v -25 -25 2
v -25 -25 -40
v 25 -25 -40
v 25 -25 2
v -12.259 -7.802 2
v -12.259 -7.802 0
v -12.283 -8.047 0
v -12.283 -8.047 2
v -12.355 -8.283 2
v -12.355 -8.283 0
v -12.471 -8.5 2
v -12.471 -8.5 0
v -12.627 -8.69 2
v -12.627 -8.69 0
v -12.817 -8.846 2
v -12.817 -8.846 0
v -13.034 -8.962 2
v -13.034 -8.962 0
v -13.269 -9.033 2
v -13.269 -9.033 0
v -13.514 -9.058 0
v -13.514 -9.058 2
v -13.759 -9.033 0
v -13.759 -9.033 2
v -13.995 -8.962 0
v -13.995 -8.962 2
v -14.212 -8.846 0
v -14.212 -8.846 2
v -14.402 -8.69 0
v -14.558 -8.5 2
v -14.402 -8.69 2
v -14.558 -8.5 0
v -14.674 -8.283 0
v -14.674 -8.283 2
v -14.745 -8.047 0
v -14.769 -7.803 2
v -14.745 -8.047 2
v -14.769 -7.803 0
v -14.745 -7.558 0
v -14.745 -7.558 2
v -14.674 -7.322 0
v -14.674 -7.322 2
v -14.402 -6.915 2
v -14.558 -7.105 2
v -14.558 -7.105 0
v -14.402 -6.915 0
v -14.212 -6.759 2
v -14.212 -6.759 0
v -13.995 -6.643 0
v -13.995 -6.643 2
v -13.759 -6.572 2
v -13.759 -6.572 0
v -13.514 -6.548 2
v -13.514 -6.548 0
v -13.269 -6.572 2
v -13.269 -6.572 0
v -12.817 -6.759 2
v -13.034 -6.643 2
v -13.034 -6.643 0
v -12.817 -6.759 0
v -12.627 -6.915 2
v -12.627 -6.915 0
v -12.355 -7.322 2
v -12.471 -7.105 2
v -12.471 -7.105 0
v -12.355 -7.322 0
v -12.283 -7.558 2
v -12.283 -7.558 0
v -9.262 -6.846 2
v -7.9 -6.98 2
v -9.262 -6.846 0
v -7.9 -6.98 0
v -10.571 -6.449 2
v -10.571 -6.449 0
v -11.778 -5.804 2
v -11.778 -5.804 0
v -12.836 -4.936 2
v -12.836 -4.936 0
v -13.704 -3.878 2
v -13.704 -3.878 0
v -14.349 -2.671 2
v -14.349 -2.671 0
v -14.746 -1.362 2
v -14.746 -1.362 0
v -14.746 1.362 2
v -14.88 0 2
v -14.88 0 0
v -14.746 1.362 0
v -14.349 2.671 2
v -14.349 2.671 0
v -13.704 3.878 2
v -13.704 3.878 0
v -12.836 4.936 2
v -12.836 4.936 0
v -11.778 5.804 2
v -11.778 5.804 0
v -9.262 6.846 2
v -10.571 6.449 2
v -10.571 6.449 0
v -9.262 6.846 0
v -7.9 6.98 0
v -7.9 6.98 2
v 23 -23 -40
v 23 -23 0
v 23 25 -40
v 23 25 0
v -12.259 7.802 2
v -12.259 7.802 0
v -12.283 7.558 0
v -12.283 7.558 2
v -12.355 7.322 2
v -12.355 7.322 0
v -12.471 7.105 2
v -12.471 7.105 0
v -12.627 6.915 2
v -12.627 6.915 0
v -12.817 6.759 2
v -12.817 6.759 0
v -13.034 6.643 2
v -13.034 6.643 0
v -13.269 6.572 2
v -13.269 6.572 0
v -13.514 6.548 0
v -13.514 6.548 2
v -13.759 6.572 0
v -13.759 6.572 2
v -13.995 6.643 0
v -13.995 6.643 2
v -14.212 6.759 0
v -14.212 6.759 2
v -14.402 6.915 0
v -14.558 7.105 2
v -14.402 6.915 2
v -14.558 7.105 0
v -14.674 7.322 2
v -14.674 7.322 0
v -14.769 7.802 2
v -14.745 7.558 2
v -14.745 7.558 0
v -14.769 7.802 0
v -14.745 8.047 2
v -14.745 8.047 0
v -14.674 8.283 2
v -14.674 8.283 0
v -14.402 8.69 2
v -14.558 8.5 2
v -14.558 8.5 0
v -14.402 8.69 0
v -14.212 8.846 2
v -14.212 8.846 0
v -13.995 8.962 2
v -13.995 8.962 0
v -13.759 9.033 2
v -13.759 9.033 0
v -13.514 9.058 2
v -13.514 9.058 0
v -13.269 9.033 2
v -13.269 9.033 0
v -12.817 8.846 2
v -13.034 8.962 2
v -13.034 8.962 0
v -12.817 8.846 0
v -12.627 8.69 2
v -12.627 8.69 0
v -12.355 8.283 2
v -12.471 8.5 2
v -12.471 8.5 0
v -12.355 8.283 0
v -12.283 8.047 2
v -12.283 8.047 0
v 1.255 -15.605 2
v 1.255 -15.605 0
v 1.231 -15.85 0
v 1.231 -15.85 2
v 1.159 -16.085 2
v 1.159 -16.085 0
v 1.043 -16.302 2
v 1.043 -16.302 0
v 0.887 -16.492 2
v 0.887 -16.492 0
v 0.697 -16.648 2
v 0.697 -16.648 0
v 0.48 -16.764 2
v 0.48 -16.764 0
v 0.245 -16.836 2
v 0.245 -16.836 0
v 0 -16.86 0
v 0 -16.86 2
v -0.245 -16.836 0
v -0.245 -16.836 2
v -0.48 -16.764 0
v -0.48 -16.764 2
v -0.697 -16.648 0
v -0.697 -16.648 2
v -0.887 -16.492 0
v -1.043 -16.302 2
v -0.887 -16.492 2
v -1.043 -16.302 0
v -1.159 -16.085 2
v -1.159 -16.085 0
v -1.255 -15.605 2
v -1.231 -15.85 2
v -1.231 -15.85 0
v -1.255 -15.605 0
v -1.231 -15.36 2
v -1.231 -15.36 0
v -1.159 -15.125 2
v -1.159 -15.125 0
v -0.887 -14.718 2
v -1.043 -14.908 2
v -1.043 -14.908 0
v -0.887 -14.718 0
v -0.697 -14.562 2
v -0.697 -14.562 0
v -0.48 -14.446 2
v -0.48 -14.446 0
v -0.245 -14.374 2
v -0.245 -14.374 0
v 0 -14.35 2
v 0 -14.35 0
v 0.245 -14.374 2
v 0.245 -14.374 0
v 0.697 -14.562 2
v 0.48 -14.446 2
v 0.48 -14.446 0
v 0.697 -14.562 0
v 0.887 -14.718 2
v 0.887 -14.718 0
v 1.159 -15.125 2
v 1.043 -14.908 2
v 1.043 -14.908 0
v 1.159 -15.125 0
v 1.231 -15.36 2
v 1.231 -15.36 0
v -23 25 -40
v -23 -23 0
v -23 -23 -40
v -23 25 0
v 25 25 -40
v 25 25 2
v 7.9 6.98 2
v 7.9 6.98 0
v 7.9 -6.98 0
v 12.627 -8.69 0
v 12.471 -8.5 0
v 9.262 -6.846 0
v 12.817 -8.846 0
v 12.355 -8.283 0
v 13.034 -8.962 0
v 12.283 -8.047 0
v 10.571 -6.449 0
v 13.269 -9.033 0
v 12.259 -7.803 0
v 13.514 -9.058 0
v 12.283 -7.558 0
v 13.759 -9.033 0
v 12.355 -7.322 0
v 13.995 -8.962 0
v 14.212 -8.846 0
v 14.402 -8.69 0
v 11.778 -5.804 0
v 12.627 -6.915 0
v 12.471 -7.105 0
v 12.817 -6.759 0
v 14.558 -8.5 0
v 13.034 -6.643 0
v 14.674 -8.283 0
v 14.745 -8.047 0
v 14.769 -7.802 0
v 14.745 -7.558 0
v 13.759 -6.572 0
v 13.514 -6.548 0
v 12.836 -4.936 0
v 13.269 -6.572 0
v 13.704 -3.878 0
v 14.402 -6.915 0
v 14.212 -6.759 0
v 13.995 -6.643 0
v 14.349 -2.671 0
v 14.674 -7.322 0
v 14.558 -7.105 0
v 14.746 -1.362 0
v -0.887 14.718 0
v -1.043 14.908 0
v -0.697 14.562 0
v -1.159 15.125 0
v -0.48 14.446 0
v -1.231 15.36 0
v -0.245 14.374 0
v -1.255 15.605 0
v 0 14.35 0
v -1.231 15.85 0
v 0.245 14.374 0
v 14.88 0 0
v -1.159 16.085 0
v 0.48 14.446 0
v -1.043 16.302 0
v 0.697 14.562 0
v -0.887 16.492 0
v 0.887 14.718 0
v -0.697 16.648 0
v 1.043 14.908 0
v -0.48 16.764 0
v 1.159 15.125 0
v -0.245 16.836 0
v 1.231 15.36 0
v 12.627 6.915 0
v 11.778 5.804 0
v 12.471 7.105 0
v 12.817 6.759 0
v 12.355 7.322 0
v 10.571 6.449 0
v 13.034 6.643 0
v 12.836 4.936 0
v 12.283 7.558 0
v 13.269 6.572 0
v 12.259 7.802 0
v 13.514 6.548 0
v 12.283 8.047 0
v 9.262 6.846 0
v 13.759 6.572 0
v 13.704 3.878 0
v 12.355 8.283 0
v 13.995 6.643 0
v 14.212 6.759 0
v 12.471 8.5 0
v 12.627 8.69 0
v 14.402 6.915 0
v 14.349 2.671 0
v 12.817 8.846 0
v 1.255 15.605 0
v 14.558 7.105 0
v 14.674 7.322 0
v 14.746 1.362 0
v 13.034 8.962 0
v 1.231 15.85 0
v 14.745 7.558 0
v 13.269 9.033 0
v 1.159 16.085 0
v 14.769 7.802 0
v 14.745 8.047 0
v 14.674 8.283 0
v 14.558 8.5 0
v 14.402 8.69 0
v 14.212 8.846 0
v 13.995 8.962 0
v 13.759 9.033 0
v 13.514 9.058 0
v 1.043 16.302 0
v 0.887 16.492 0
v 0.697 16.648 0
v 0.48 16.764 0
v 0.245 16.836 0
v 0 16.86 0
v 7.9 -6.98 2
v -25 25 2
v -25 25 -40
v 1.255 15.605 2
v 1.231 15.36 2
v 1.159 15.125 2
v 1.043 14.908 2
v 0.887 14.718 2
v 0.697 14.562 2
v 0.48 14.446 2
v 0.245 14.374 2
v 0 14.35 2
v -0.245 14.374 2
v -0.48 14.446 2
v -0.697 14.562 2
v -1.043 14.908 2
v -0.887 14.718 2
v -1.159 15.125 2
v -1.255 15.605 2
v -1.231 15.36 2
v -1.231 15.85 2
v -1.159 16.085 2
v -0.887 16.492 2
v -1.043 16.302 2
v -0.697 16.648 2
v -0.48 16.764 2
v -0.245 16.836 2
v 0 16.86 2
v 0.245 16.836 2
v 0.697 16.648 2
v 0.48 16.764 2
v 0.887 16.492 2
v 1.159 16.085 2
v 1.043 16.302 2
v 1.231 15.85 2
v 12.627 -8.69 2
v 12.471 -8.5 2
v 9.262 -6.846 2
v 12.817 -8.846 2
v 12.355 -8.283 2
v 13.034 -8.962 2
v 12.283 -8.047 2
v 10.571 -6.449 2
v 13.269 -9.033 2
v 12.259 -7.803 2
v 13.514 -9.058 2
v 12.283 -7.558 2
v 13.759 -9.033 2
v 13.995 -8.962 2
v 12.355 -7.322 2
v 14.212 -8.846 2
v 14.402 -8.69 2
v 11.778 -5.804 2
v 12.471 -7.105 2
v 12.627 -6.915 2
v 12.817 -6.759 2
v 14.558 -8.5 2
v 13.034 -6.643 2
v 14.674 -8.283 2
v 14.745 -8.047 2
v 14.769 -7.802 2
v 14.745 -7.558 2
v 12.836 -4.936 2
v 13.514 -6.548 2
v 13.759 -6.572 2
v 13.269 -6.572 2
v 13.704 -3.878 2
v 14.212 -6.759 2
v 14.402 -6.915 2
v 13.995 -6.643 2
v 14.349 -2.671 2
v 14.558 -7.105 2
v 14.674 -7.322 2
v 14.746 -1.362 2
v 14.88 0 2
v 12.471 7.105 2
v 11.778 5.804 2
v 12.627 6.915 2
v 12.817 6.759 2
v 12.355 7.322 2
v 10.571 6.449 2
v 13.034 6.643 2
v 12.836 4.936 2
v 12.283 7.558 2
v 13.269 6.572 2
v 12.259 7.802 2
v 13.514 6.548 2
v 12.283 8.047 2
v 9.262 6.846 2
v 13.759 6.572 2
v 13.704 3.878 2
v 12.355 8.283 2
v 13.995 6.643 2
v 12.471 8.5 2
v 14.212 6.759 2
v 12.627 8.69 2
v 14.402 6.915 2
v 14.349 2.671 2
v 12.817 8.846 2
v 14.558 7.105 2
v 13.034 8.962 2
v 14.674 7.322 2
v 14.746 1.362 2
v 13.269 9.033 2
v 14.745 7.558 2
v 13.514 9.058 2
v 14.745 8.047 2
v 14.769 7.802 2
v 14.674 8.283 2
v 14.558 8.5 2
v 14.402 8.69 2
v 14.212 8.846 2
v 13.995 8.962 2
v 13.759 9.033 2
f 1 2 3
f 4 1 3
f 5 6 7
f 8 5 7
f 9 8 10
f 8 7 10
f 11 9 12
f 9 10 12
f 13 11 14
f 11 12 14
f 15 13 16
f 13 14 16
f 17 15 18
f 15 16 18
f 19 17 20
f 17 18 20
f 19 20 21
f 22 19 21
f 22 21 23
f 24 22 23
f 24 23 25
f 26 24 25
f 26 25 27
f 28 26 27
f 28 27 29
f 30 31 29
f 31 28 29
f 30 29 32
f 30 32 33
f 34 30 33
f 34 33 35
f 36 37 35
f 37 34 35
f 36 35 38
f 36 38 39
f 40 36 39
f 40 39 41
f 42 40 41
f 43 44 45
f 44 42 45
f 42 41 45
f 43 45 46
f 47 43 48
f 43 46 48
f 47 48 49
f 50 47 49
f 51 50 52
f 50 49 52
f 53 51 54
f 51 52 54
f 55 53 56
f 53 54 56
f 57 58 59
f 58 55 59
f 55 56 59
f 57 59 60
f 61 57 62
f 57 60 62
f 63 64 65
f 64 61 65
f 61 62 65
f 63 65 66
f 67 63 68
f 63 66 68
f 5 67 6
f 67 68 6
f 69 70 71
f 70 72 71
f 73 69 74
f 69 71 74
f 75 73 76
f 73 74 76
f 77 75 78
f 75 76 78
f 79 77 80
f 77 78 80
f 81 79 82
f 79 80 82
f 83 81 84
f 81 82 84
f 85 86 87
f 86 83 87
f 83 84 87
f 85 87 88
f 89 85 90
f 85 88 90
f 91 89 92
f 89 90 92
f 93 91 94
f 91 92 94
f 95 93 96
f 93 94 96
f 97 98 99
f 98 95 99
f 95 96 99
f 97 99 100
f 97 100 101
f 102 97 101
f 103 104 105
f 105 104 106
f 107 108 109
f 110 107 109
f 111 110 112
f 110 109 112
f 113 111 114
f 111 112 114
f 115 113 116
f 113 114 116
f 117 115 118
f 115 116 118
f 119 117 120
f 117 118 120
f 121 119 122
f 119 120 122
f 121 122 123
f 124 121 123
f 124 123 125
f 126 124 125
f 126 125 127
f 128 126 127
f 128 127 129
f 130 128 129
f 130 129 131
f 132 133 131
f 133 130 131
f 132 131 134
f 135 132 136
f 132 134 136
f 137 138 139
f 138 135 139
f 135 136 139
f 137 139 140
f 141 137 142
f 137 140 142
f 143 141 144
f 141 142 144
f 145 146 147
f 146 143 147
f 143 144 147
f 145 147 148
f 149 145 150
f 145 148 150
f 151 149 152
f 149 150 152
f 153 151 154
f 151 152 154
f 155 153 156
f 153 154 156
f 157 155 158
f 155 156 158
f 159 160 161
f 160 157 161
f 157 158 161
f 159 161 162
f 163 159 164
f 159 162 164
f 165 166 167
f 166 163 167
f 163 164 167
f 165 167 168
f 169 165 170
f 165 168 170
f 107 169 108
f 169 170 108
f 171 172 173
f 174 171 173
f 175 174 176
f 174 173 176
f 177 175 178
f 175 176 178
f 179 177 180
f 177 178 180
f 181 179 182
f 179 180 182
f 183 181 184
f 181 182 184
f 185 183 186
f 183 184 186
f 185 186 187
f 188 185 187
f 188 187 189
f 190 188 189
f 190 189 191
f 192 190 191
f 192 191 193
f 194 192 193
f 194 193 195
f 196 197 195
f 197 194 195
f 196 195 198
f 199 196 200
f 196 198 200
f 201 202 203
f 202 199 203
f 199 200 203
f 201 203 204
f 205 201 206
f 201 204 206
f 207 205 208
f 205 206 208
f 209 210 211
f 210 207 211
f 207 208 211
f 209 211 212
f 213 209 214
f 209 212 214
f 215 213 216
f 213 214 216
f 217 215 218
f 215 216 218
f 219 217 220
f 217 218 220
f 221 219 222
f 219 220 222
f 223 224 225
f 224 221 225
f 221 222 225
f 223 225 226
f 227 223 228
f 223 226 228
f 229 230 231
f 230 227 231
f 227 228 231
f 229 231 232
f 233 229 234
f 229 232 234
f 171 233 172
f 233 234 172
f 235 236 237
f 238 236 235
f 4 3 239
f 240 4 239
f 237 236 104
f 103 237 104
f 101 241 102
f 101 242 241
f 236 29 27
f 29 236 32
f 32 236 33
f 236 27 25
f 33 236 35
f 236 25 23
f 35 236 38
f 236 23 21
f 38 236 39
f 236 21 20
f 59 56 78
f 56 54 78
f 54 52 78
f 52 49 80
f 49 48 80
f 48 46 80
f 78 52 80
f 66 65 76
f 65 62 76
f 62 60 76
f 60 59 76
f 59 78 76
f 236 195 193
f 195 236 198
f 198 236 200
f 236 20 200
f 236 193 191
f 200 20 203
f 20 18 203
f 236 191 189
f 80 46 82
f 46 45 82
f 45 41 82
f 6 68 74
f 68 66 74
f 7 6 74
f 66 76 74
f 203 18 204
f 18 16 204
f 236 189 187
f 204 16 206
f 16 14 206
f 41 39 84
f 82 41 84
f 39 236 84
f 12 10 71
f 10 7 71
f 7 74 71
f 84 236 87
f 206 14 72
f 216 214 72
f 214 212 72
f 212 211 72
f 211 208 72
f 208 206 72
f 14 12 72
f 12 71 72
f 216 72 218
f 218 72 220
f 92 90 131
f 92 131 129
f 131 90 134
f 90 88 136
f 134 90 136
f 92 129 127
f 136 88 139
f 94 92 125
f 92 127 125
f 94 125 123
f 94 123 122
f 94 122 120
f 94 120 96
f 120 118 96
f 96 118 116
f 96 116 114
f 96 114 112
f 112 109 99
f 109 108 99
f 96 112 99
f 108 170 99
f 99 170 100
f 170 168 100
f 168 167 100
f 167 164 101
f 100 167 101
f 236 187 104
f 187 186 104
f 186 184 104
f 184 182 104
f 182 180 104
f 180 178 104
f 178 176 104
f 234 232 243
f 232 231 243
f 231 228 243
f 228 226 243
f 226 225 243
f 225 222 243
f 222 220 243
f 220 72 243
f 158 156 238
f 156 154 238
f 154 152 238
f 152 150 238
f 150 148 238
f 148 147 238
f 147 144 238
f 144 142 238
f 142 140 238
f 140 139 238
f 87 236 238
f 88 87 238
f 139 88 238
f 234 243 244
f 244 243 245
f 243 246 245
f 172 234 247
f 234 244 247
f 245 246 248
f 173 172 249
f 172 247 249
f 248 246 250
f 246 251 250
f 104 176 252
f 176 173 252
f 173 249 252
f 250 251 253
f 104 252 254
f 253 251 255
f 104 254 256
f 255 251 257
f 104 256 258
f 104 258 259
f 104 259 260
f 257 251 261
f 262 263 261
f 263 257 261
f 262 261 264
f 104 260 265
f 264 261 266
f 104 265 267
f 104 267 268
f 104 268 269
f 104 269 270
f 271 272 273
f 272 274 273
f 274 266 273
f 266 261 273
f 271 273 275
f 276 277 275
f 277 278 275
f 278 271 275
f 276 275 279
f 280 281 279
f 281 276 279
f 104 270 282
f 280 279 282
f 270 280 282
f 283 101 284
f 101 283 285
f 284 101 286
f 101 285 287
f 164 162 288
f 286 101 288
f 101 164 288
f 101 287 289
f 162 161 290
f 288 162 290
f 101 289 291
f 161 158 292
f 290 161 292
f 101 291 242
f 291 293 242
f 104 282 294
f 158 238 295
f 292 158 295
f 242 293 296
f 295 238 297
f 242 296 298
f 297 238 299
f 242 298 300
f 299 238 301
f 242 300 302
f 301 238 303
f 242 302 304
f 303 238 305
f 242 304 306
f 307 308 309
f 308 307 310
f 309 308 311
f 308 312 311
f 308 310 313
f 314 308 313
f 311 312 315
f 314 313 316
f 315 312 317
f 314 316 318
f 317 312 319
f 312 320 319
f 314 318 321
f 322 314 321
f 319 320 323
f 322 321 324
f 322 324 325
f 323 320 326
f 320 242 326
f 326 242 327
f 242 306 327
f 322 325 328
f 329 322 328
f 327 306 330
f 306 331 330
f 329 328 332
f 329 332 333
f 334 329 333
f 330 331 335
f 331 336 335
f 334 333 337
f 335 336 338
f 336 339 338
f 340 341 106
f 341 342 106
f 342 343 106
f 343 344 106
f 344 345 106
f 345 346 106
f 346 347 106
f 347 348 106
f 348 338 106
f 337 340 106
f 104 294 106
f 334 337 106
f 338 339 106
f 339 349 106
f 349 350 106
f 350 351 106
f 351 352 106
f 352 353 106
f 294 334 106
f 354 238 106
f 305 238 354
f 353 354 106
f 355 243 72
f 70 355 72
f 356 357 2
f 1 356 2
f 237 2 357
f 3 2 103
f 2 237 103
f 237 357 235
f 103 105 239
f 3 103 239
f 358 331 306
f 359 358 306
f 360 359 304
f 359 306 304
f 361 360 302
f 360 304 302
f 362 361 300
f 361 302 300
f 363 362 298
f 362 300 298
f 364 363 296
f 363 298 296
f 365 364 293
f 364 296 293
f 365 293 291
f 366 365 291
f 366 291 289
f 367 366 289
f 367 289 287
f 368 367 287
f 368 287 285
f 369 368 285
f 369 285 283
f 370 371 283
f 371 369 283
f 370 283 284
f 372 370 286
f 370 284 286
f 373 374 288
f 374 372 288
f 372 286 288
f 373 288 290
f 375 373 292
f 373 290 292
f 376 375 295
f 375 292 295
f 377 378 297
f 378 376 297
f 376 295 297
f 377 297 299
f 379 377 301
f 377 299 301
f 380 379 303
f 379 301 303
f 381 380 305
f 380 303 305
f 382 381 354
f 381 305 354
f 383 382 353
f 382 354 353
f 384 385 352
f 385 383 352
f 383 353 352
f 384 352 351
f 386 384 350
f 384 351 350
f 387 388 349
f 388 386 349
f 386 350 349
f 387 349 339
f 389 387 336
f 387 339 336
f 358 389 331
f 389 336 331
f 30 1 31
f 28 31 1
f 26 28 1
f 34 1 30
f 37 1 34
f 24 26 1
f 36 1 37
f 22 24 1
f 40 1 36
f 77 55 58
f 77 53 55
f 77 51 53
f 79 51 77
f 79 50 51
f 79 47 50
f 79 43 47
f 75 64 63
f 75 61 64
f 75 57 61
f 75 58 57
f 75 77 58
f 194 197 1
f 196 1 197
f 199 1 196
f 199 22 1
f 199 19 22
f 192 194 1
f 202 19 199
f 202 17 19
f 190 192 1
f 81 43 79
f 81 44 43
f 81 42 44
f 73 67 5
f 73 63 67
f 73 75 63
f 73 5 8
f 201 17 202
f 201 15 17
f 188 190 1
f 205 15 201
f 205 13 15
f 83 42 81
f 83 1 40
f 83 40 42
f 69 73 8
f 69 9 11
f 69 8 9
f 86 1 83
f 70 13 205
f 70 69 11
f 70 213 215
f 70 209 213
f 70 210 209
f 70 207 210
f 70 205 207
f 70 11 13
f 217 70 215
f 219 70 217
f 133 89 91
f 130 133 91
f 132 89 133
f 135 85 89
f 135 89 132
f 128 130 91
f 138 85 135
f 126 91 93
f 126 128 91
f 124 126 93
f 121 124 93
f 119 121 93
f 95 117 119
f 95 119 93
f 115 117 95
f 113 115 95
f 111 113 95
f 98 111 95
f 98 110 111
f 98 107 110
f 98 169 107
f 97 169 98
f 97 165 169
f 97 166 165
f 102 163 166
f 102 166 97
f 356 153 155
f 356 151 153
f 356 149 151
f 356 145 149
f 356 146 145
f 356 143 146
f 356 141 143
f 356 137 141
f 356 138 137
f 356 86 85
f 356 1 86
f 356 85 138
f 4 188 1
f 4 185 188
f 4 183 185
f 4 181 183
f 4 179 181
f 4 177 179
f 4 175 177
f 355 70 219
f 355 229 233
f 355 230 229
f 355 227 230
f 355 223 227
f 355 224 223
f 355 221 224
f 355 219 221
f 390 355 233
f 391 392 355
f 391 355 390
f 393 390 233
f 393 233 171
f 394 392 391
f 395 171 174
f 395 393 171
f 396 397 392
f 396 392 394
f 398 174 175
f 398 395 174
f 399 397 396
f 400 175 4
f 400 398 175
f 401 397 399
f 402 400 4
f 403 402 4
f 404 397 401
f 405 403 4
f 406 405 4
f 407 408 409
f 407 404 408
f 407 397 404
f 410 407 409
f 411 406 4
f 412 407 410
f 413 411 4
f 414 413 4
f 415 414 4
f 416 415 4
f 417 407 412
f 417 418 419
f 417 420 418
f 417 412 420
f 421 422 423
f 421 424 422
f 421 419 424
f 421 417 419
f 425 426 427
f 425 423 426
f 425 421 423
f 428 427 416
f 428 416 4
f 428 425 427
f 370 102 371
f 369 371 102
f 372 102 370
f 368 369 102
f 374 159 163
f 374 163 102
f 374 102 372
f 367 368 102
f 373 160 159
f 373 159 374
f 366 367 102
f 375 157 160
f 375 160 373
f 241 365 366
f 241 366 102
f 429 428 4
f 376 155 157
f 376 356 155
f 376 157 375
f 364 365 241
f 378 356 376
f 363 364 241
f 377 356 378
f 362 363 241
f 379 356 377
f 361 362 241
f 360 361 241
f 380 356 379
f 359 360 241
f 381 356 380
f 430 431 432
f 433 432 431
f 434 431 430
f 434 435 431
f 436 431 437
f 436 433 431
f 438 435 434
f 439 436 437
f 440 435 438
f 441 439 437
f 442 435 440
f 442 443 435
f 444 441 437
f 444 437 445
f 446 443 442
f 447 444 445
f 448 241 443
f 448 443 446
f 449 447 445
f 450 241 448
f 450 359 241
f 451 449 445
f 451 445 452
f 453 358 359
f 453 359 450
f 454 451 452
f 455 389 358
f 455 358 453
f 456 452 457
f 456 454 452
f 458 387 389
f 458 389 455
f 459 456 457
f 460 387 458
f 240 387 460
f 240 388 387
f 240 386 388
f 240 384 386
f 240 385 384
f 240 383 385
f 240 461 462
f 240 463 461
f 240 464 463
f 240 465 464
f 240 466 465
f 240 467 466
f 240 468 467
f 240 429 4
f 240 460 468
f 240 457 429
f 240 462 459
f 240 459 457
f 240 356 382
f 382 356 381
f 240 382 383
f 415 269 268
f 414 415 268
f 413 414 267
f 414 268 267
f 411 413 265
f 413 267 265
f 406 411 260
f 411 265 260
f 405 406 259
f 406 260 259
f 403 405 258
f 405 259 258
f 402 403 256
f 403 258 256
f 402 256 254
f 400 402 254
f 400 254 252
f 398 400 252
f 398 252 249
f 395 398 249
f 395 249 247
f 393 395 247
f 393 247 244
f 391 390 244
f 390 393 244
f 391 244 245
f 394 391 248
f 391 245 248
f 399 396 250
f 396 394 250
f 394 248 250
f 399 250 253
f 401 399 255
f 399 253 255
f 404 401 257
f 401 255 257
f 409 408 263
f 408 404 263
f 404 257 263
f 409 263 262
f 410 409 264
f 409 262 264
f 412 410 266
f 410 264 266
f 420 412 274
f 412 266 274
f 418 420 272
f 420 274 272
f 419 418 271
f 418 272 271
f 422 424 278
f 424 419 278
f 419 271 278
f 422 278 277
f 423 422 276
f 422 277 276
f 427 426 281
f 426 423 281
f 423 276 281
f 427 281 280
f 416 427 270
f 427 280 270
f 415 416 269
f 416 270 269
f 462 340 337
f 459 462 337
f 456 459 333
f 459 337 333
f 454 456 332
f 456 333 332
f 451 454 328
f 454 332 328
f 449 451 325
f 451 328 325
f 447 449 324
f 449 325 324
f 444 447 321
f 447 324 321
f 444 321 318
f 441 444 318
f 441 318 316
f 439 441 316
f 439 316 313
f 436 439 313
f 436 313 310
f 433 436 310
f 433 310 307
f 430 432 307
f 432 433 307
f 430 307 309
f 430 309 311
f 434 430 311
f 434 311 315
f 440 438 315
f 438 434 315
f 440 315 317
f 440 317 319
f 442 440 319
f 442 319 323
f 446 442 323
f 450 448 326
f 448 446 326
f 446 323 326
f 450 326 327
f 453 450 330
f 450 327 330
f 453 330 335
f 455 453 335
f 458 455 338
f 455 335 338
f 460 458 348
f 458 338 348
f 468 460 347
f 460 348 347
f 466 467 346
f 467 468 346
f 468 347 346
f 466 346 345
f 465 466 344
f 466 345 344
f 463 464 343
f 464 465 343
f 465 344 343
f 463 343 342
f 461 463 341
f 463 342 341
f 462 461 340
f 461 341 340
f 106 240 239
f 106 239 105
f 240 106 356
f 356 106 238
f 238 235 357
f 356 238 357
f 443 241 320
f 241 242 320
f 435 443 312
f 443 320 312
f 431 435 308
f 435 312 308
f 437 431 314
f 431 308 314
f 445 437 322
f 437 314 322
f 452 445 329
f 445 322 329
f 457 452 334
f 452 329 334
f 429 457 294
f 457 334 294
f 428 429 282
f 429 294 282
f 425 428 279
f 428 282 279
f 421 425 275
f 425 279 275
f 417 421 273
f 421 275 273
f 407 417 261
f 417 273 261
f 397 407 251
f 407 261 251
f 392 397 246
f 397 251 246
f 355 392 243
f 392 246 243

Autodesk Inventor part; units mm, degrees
ref_plane "YZ Plane" through (0, 0, 0) normal (1, 0, 0) x (0, 1, 0)
ref_plane "XZ Plane" through (0, 0, 0) normal (0, 1, 0) x (-1, 0, 0)
ref_plane "XY Plane" through (0, 0, 0) normal (0, 0, 1) x (1, 0, 0)
sketch "Sketch1" plane through (0, 0, 0) normal (0, 0, 1) x (1, 0, 0)
  circle A0 centre (0, 0) radius 18.38
  circle A1 centre (13.5143, 7.8025) radius 1.255
  circle A2 centre (0, 15.605) radius 1.255
  circle A3 centre (-13.5143, 7.8025) radius 1.255
  circle A4 centre (-13.5143, -7.8025) radius 1.255
  circle A5 centre (0, -15.605) radius 1.255
  circle A6 centre (13.5143, -7.8025) radius 1.255
  circle A7 centre (7.9, 0) radius 5.98
  line L0 (25, 25) -> (-25, 25)
  line L1 (-25, 25) -> (-25, -25)
  line L2 (-25, -25) -> (25, -25)
  line L3 (25, -25) -> (25, 25)
  line L4 (25, 25) -> (-25, -25) construction
  line L5 (-25, 25) -> (25, -25) construction
  circle A8 centre (7.9, 0) radius 6.98
  line L6 (7.9, -6.98) -> (-7.9, -6.98)
  line L7 (7.9, 6.98) -> (-7.9, 6.98)
  circle A9 centre (-7.9, 0) radius 6.98
  line L8 (23, 23) -> (-23, 23)
  line L9 (-23, 23) -> (-23, -23)
  line L10 (-23, -23) -> (23, -23)
  line L11 (23, -23) -> (23, 23)
  line L12 (-23, 23) -> (-23, 25)
  line L13 (23, 23) -> (23, 25)
  line L14 (23, -23) -> (23, -25)
  point P0 (0, 0)
  dimension "d0" = 50
  dimension "d1" = 50
  dimension "d2" = 1
  dimension "d3" = 15.8
  dimension "d6" = 2
extrude "Extrusion1" add sketch "Sketch1" along normal blind 2 contours A0 | L3 L2 L14 L11 L13 L0 | L13 L8 L12 L0 | L12 L9 L10 L14 L2 L1 L0 | L11 L10 L9 L8
extrude "Extrusion2" add sketch "Sketch1" against normal blind 40 contours L3 L2 L14 L11 L13 L0 | L12 L9 L10 L14 L2 L1 L0
thread "Thread1" size "M2.5x0.45" class "6H" standard "ISO Metric profile" length 10
thread "Thread2" size "M2.5x0.45" class "6H" standard "ANSI Metric M Profile" length 10
thread "Thread3" size "M2.5x0.45" class "6H" standard "ISO Metric profile" full length
thread "Thread4" size "M2.5x0.45" class "6H" standard "ANSI Metric M Profile" full length
thread "Thread5" size "M2.5x0.45" class "6H" standard "ANSI Metric M Profile" full length
thread "Thread6" size "M2.5x0.45" class "6H" standard "ANSI Metric M Profile" full length
properties part number "drivemotorcasing"
